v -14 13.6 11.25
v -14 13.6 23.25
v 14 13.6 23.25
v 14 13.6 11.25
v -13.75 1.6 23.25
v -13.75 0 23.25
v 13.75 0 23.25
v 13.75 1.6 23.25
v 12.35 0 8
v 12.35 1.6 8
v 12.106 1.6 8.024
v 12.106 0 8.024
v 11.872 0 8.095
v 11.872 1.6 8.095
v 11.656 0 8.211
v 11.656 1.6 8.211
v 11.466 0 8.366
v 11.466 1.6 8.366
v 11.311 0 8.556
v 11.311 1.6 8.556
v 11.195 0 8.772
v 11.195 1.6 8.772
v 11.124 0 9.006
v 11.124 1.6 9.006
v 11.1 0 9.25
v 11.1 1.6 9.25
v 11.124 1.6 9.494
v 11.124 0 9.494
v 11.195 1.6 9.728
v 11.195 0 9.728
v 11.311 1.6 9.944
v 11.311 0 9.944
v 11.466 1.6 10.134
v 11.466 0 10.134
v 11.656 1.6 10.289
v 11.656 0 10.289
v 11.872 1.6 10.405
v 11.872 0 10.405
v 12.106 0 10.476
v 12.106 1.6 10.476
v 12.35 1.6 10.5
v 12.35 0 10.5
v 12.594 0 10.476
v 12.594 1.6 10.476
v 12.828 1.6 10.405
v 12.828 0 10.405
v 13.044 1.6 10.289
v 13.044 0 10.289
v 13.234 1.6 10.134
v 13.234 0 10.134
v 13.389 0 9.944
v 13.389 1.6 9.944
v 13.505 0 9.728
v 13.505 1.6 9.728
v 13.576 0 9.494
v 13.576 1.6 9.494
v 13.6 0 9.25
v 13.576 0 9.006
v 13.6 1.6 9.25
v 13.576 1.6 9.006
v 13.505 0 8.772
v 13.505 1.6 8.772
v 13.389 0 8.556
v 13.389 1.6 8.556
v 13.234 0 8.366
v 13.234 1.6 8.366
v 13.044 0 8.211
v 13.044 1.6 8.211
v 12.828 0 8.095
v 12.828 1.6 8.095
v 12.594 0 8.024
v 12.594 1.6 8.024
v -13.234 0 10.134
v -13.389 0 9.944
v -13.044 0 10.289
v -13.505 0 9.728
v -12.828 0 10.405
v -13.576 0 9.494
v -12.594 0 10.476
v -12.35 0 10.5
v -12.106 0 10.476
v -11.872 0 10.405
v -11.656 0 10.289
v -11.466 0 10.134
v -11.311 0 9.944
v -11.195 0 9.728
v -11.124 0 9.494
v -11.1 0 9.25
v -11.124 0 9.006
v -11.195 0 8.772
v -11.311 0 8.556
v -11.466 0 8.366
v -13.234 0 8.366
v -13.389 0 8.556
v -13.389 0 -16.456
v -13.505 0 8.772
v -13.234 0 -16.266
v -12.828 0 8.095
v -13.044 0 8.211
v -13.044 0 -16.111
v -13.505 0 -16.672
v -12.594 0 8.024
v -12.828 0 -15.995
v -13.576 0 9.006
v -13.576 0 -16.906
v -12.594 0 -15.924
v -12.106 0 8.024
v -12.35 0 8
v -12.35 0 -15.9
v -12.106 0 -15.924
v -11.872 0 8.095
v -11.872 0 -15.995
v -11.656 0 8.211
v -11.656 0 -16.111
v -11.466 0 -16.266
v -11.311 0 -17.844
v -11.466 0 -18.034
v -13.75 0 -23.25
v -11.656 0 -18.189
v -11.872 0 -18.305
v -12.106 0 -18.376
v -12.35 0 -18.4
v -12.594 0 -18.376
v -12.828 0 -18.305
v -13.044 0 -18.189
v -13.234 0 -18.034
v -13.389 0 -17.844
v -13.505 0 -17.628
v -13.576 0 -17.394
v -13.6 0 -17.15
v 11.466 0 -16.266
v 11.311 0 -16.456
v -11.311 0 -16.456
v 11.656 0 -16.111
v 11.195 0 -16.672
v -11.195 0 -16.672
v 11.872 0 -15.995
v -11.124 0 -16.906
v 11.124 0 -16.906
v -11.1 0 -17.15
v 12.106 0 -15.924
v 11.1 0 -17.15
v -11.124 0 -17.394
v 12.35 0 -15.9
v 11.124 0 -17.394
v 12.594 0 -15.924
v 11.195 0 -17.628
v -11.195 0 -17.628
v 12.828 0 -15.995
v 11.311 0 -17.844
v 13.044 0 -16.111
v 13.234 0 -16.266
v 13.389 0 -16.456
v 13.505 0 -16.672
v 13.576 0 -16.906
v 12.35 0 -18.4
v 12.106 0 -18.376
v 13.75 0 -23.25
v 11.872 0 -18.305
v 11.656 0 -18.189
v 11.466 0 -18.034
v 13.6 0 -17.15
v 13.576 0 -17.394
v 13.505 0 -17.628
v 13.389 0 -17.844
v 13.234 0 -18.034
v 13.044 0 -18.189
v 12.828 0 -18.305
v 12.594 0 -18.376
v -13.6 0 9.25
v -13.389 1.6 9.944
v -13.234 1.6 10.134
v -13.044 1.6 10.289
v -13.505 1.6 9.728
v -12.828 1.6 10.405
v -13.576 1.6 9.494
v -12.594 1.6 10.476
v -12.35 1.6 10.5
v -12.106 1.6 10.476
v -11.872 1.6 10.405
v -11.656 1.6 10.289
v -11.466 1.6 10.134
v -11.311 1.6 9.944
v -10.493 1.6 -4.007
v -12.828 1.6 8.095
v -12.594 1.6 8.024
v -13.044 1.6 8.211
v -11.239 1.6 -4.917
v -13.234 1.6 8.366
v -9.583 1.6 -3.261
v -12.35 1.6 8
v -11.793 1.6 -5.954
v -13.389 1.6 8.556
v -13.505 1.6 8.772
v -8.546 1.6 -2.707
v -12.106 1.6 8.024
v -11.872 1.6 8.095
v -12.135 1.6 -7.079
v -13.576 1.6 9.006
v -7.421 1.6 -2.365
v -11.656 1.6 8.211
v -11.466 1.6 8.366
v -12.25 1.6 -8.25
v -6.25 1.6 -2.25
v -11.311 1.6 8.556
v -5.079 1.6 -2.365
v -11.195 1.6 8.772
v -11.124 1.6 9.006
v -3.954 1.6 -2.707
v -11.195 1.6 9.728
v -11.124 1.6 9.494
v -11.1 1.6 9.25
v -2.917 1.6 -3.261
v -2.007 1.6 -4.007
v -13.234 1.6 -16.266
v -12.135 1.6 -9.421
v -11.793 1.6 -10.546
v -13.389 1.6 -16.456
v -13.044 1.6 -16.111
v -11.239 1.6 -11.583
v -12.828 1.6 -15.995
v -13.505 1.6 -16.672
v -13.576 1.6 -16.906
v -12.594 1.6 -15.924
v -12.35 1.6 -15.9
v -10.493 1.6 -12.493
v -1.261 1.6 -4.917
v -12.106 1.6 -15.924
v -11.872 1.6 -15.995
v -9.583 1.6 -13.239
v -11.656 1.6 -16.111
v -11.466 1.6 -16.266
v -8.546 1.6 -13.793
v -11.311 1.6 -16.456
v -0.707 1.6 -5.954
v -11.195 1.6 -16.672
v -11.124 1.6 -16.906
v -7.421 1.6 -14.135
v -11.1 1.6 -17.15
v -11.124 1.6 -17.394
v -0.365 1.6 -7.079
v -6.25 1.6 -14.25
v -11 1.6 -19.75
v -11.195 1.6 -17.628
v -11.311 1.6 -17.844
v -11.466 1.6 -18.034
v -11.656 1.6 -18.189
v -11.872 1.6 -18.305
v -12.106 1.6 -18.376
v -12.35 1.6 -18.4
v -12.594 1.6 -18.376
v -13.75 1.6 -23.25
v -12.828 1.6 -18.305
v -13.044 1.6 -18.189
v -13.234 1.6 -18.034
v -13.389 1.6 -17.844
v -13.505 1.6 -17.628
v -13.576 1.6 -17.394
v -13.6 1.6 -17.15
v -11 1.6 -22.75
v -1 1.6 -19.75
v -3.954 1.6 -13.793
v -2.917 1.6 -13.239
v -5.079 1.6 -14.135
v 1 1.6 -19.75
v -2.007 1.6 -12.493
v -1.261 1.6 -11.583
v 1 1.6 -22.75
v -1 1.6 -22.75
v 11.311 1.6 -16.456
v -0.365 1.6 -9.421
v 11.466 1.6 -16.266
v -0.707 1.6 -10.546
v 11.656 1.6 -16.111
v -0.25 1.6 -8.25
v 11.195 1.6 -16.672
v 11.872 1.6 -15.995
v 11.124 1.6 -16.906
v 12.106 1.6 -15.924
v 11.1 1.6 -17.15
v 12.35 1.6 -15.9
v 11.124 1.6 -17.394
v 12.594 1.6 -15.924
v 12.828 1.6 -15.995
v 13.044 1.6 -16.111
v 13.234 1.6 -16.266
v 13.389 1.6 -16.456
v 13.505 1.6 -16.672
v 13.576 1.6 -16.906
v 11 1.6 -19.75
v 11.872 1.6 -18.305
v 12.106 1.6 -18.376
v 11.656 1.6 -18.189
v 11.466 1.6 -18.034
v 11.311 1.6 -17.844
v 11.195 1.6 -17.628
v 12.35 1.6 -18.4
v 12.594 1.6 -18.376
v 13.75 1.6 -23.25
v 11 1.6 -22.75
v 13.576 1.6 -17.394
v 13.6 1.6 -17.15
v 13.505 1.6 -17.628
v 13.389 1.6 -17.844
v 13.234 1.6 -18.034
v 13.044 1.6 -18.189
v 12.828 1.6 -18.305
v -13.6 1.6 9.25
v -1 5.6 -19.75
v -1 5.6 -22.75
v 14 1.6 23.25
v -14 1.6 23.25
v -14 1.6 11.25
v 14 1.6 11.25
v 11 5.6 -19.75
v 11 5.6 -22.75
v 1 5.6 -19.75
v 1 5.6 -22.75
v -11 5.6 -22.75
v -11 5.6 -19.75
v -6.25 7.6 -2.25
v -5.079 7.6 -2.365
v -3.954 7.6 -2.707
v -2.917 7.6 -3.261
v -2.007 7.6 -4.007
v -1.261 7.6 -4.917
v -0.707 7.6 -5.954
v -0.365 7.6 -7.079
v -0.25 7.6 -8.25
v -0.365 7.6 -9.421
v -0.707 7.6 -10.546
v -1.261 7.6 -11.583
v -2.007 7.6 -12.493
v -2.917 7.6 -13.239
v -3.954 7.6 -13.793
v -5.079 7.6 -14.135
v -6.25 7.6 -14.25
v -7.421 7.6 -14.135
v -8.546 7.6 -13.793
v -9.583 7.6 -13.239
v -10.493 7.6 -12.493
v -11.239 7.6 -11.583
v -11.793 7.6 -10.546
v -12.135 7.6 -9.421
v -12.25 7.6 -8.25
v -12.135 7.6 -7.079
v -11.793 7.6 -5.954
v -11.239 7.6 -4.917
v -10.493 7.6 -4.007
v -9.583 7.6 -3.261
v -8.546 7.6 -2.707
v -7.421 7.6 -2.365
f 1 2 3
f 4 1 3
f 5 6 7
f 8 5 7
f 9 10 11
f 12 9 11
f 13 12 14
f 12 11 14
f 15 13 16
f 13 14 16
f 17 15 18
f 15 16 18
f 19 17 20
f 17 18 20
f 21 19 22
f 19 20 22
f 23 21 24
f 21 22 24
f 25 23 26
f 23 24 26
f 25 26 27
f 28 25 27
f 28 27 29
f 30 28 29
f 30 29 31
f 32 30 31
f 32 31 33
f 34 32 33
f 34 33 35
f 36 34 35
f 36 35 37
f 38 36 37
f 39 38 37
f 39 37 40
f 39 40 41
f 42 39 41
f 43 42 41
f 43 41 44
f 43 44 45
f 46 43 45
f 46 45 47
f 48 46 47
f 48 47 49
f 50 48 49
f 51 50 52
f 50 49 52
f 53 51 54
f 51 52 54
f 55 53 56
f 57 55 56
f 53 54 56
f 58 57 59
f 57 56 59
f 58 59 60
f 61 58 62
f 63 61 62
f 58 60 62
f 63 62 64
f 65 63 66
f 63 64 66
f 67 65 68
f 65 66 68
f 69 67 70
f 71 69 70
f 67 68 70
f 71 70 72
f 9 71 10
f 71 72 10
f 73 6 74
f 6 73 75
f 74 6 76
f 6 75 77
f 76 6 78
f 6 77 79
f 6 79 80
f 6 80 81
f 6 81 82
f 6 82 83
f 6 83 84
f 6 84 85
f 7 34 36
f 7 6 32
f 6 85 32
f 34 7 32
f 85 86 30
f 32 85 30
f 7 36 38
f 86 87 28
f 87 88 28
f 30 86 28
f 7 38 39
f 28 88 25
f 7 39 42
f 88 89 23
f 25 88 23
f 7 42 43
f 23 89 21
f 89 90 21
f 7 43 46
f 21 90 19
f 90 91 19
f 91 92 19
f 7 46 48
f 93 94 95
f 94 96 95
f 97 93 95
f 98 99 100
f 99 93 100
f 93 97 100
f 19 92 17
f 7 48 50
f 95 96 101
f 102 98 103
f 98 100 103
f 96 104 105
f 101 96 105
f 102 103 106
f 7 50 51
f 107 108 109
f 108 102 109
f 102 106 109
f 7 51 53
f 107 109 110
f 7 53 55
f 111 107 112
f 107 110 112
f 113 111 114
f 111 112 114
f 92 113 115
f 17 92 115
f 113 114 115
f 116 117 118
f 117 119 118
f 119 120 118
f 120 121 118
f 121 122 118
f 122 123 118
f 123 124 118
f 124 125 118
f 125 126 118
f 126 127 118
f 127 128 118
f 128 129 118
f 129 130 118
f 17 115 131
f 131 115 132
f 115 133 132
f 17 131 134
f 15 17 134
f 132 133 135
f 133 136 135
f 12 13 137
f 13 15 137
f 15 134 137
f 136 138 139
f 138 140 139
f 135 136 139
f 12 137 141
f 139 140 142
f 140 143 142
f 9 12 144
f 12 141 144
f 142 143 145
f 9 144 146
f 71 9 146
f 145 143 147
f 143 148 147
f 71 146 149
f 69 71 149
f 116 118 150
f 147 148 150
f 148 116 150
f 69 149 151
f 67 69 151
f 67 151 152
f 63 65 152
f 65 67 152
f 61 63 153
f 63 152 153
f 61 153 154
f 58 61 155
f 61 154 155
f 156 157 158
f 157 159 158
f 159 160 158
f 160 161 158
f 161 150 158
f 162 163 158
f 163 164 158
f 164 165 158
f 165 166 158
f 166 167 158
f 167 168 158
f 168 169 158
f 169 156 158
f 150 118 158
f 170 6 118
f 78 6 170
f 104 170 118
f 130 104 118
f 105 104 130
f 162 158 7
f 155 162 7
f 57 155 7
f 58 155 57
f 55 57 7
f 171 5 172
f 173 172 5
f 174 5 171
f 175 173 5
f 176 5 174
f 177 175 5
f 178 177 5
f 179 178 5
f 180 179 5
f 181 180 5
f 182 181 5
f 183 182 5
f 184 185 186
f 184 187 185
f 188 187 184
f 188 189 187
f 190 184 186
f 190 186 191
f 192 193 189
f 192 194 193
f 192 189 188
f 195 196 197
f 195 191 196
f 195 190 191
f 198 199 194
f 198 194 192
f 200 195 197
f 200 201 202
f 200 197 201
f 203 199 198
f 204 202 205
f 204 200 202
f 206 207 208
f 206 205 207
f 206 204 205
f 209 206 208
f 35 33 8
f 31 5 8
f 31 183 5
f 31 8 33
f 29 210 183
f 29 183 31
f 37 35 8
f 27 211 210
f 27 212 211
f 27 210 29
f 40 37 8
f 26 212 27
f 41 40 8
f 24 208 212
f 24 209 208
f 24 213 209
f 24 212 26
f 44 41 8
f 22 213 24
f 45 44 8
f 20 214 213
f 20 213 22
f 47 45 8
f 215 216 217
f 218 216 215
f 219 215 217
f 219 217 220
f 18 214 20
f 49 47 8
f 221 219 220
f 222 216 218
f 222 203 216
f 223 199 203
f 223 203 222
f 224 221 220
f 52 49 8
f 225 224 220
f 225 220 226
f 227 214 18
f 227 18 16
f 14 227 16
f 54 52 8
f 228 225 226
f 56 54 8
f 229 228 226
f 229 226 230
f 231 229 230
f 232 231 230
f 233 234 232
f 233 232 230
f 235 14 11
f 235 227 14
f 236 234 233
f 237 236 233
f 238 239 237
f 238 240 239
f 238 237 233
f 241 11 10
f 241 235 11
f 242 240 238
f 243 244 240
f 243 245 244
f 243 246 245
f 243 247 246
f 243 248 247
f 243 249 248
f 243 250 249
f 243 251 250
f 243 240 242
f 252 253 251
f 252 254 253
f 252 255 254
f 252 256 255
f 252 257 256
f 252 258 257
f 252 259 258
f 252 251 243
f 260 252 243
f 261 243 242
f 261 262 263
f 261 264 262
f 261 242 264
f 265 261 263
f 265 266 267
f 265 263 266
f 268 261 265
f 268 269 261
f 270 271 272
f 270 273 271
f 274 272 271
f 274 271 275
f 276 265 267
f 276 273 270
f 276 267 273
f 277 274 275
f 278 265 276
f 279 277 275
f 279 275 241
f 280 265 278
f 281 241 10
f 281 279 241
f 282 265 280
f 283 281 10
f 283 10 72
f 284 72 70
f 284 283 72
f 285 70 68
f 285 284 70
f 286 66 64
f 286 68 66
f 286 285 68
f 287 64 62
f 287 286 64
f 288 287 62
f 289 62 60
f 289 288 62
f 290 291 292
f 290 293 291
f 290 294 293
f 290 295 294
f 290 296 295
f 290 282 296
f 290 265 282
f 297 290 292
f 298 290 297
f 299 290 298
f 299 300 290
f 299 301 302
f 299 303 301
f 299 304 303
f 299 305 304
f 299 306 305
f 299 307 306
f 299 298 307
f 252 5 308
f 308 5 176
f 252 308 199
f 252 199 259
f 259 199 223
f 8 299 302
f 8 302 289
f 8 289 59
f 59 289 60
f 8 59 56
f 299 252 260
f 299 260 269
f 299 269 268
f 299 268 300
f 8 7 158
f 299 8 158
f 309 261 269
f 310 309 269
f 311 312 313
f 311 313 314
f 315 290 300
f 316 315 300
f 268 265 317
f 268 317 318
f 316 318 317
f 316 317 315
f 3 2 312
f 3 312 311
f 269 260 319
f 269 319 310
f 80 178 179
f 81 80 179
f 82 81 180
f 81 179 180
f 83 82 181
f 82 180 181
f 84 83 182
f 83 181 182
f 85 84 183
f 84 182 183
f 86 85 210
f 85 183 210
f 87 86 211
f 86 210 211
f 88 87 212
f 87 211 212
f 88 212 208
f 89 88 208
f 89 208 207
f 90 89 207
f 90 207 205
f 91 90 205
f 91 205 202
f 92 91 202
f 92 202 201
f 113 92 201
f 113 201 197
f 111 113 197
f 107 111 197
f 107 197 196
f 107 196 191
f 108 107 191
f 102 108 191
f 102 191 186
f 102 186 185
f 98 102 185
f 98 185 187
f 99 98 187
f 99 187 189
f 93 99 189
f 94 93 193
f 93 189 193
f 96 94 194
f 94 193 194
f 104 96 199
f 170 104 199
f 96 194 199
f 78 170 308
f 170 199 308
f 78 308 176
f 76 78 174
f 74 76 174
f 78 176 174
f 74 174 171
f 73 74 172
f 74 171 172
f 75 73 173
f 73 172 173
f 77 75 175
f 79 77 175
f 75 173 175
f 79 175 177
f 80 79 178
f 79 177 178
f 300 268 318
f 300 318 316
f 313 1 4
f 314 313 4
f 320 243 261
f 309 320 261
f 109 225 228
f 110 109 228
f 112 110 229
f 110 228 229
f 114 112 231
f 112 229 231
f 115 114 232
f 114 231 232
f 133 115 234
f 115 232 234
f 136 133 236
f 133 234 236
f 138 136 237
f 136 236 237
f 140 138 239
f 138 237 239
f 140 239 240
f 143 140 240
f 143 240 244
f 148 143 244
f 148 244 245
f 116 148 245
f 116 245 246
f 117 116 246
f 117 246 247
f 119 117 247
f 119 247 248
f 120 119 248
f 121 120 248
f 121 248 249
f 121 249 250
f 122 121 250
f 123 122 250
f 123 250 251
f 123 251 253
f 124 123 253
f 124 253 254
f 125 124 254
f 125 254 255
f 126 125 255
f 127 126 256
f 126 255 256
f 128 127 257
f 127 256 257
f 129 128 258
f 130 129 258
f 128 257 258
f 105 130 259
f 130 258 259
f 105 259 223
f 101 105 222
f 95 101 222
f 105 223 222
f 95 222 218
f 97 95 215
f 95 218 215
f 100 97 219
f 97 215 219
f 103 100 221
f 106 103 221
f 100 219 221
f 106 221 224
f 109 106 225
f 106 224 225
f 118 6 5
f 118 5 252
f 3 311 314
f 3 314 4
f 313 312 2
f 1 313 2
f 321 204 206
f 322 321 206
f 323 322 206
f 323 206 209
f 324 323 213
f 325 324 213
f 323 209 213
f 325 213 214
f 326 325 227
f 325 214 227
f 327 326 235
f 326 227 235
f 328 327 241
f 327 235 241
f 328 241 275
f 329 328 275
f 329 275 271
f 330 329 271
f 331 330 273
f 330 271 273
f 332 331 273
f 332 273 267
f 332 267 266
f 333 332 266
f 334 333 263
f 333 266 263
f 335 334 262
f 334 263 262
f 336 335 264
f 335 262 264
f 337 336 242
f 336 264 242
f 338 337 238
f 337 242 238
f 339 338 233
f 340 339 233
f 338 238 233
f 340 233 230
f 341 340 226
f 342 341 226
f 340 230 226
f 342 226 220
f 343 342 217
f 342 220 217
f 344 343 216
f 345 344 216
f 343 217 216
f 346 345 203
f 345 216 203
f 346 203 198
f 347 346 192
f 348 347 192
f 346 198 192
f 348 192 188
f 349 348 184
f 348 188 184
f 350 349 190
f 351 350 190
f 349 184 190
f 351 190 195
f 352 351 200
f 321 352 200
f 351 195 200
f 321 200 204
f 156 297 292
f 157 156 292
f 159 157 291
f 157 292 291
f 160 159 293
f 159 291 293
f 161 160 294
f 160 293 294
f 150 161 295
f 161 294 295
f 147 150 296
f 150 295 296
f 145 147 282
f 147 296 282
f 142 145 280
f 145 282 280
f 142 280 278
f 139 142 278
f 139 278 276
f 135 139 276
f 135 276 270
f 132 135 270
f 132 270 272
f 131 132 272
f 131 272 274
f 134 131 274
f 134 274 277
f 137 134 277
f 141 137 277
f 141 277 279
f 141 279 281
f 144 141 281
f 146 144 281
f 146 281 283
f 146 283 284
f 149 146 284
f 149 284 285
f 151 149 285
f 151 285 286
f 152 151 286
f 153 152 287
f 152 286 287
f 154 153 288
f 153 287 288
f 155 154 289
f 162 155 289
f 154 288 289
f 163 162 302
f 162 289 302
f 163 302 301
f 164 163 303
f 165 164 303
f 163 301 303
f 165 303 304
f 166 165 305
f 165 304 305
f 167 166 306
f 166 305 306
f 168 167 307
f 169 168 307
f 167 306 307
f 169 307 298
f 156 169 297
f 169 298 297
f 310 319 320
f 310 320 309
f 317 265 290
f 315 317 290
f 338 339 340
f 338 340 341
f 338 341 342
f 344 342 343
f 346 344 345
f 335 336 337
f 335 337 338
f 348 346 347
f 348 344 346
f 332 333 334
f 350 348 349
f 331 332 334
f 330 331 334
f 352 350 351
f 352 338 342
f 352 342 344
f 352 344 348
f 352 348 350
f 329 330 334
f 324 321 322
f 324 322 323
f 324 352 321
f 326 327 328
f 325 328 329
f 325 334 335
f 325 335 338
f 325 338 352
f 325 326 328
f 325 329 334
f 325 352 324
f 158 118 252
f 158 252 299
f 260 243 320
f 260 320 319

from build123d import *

# Parameters (mm, degrees)
SKETCH1_W            = 27.5
SKETCH1_H            = 46.5
PCB_DEPTH            = 1.6
SKETCH2_W            = 28
SKETCH2_H            = 12
SCANNER_DEPTH        = 12
SKETCH3_R            = 1.25
MOUNTING_HOLES_DEPTH = 30.674273369
SKETCH4_R            = 6
PIEZO_BUZZER_DEPTH   = 6
SKETCH5_W            = 10
SKETCH5_H            = 3
CONNECTORS_DEPTH     = 4


with BuildPart() as part:
    # Sketch1 → PCB (new body)
    with BuildSketch(Plane(origin=(0, 0, 0), x_dir=(1, 0, 0), z_dir=(0, 1, 0))):
        Rectangle(SKETCH1_W, SKETCH1_H)
    extrude(amount=PCB_DEPTH)

    # Sketch3 → Mounting Holes (cut, through all)
    with BuildSketch(Plane(origin=(0, 1.6, 0), x_dir=(1, 0, 0), z_dir=(0, 1, 0))):
        with Locations(Location((-12.35, 17.15, 0), (0, 0, 270))):
            Circle(SKETCH3_R)
        with Locations(Location((-12.35, -9.25, 0), (0, 0, 270))):
            Circle(SKETCH3_R)
        with Locations(Location((12.35, -9.25, 0), (0, 0, 90))):
            Circle(SKETCH3_R)
        with Locations(Location((12.35, 17.15, 0), (0, 0, 90))):
            Circle(SKETCH3_R)
    extrude(amount=-MOUNTING_HOLES_DEPTH, mode=Mode.SUBTRACT)

    # Sketch4 → Piezo Buzzer (add)
    with BuildSketch(Plane(origin=(0, 1.6, 0), x_dir=(1, 0, 0), z_dir=(0, 1, 0))):
        with Locations(Location((-6.25, 8.25, 0), (0, 0, 270))):
            Circle(SKETCH4_R)
    extrude(amount=PIEZO_BUZZER_DEPTH)

    # Sketch5 → Connectors (add)
    with BuildSketch(Plane(origin=(0, 1.6, 0), x_dir=(1, 0, 0), z_dir=(0, 1, 0))):
        with Locations((-6, 21.25)):
            Rectangle(SKETCH5_W, SKETCH5_H)
        with Locations((6, 21.25)):
            Rectangle(SKETCH5_W, SKETCH5_H)
    extrude(amount=CONNECTORS_DEPTH)


with BuildPart() as body_2:
    # Sketch2 → Scanner (new body)
    with BuildSketch(Plane.XY.offset(23.25)):
        with Locations((0, 7.6)):
            Rectangle(SKETCH2_W, SKETCH2_H)
    extrude(amount=-SCANNER_DEPTH)


solid = Compound([part.part, body_2.part])
